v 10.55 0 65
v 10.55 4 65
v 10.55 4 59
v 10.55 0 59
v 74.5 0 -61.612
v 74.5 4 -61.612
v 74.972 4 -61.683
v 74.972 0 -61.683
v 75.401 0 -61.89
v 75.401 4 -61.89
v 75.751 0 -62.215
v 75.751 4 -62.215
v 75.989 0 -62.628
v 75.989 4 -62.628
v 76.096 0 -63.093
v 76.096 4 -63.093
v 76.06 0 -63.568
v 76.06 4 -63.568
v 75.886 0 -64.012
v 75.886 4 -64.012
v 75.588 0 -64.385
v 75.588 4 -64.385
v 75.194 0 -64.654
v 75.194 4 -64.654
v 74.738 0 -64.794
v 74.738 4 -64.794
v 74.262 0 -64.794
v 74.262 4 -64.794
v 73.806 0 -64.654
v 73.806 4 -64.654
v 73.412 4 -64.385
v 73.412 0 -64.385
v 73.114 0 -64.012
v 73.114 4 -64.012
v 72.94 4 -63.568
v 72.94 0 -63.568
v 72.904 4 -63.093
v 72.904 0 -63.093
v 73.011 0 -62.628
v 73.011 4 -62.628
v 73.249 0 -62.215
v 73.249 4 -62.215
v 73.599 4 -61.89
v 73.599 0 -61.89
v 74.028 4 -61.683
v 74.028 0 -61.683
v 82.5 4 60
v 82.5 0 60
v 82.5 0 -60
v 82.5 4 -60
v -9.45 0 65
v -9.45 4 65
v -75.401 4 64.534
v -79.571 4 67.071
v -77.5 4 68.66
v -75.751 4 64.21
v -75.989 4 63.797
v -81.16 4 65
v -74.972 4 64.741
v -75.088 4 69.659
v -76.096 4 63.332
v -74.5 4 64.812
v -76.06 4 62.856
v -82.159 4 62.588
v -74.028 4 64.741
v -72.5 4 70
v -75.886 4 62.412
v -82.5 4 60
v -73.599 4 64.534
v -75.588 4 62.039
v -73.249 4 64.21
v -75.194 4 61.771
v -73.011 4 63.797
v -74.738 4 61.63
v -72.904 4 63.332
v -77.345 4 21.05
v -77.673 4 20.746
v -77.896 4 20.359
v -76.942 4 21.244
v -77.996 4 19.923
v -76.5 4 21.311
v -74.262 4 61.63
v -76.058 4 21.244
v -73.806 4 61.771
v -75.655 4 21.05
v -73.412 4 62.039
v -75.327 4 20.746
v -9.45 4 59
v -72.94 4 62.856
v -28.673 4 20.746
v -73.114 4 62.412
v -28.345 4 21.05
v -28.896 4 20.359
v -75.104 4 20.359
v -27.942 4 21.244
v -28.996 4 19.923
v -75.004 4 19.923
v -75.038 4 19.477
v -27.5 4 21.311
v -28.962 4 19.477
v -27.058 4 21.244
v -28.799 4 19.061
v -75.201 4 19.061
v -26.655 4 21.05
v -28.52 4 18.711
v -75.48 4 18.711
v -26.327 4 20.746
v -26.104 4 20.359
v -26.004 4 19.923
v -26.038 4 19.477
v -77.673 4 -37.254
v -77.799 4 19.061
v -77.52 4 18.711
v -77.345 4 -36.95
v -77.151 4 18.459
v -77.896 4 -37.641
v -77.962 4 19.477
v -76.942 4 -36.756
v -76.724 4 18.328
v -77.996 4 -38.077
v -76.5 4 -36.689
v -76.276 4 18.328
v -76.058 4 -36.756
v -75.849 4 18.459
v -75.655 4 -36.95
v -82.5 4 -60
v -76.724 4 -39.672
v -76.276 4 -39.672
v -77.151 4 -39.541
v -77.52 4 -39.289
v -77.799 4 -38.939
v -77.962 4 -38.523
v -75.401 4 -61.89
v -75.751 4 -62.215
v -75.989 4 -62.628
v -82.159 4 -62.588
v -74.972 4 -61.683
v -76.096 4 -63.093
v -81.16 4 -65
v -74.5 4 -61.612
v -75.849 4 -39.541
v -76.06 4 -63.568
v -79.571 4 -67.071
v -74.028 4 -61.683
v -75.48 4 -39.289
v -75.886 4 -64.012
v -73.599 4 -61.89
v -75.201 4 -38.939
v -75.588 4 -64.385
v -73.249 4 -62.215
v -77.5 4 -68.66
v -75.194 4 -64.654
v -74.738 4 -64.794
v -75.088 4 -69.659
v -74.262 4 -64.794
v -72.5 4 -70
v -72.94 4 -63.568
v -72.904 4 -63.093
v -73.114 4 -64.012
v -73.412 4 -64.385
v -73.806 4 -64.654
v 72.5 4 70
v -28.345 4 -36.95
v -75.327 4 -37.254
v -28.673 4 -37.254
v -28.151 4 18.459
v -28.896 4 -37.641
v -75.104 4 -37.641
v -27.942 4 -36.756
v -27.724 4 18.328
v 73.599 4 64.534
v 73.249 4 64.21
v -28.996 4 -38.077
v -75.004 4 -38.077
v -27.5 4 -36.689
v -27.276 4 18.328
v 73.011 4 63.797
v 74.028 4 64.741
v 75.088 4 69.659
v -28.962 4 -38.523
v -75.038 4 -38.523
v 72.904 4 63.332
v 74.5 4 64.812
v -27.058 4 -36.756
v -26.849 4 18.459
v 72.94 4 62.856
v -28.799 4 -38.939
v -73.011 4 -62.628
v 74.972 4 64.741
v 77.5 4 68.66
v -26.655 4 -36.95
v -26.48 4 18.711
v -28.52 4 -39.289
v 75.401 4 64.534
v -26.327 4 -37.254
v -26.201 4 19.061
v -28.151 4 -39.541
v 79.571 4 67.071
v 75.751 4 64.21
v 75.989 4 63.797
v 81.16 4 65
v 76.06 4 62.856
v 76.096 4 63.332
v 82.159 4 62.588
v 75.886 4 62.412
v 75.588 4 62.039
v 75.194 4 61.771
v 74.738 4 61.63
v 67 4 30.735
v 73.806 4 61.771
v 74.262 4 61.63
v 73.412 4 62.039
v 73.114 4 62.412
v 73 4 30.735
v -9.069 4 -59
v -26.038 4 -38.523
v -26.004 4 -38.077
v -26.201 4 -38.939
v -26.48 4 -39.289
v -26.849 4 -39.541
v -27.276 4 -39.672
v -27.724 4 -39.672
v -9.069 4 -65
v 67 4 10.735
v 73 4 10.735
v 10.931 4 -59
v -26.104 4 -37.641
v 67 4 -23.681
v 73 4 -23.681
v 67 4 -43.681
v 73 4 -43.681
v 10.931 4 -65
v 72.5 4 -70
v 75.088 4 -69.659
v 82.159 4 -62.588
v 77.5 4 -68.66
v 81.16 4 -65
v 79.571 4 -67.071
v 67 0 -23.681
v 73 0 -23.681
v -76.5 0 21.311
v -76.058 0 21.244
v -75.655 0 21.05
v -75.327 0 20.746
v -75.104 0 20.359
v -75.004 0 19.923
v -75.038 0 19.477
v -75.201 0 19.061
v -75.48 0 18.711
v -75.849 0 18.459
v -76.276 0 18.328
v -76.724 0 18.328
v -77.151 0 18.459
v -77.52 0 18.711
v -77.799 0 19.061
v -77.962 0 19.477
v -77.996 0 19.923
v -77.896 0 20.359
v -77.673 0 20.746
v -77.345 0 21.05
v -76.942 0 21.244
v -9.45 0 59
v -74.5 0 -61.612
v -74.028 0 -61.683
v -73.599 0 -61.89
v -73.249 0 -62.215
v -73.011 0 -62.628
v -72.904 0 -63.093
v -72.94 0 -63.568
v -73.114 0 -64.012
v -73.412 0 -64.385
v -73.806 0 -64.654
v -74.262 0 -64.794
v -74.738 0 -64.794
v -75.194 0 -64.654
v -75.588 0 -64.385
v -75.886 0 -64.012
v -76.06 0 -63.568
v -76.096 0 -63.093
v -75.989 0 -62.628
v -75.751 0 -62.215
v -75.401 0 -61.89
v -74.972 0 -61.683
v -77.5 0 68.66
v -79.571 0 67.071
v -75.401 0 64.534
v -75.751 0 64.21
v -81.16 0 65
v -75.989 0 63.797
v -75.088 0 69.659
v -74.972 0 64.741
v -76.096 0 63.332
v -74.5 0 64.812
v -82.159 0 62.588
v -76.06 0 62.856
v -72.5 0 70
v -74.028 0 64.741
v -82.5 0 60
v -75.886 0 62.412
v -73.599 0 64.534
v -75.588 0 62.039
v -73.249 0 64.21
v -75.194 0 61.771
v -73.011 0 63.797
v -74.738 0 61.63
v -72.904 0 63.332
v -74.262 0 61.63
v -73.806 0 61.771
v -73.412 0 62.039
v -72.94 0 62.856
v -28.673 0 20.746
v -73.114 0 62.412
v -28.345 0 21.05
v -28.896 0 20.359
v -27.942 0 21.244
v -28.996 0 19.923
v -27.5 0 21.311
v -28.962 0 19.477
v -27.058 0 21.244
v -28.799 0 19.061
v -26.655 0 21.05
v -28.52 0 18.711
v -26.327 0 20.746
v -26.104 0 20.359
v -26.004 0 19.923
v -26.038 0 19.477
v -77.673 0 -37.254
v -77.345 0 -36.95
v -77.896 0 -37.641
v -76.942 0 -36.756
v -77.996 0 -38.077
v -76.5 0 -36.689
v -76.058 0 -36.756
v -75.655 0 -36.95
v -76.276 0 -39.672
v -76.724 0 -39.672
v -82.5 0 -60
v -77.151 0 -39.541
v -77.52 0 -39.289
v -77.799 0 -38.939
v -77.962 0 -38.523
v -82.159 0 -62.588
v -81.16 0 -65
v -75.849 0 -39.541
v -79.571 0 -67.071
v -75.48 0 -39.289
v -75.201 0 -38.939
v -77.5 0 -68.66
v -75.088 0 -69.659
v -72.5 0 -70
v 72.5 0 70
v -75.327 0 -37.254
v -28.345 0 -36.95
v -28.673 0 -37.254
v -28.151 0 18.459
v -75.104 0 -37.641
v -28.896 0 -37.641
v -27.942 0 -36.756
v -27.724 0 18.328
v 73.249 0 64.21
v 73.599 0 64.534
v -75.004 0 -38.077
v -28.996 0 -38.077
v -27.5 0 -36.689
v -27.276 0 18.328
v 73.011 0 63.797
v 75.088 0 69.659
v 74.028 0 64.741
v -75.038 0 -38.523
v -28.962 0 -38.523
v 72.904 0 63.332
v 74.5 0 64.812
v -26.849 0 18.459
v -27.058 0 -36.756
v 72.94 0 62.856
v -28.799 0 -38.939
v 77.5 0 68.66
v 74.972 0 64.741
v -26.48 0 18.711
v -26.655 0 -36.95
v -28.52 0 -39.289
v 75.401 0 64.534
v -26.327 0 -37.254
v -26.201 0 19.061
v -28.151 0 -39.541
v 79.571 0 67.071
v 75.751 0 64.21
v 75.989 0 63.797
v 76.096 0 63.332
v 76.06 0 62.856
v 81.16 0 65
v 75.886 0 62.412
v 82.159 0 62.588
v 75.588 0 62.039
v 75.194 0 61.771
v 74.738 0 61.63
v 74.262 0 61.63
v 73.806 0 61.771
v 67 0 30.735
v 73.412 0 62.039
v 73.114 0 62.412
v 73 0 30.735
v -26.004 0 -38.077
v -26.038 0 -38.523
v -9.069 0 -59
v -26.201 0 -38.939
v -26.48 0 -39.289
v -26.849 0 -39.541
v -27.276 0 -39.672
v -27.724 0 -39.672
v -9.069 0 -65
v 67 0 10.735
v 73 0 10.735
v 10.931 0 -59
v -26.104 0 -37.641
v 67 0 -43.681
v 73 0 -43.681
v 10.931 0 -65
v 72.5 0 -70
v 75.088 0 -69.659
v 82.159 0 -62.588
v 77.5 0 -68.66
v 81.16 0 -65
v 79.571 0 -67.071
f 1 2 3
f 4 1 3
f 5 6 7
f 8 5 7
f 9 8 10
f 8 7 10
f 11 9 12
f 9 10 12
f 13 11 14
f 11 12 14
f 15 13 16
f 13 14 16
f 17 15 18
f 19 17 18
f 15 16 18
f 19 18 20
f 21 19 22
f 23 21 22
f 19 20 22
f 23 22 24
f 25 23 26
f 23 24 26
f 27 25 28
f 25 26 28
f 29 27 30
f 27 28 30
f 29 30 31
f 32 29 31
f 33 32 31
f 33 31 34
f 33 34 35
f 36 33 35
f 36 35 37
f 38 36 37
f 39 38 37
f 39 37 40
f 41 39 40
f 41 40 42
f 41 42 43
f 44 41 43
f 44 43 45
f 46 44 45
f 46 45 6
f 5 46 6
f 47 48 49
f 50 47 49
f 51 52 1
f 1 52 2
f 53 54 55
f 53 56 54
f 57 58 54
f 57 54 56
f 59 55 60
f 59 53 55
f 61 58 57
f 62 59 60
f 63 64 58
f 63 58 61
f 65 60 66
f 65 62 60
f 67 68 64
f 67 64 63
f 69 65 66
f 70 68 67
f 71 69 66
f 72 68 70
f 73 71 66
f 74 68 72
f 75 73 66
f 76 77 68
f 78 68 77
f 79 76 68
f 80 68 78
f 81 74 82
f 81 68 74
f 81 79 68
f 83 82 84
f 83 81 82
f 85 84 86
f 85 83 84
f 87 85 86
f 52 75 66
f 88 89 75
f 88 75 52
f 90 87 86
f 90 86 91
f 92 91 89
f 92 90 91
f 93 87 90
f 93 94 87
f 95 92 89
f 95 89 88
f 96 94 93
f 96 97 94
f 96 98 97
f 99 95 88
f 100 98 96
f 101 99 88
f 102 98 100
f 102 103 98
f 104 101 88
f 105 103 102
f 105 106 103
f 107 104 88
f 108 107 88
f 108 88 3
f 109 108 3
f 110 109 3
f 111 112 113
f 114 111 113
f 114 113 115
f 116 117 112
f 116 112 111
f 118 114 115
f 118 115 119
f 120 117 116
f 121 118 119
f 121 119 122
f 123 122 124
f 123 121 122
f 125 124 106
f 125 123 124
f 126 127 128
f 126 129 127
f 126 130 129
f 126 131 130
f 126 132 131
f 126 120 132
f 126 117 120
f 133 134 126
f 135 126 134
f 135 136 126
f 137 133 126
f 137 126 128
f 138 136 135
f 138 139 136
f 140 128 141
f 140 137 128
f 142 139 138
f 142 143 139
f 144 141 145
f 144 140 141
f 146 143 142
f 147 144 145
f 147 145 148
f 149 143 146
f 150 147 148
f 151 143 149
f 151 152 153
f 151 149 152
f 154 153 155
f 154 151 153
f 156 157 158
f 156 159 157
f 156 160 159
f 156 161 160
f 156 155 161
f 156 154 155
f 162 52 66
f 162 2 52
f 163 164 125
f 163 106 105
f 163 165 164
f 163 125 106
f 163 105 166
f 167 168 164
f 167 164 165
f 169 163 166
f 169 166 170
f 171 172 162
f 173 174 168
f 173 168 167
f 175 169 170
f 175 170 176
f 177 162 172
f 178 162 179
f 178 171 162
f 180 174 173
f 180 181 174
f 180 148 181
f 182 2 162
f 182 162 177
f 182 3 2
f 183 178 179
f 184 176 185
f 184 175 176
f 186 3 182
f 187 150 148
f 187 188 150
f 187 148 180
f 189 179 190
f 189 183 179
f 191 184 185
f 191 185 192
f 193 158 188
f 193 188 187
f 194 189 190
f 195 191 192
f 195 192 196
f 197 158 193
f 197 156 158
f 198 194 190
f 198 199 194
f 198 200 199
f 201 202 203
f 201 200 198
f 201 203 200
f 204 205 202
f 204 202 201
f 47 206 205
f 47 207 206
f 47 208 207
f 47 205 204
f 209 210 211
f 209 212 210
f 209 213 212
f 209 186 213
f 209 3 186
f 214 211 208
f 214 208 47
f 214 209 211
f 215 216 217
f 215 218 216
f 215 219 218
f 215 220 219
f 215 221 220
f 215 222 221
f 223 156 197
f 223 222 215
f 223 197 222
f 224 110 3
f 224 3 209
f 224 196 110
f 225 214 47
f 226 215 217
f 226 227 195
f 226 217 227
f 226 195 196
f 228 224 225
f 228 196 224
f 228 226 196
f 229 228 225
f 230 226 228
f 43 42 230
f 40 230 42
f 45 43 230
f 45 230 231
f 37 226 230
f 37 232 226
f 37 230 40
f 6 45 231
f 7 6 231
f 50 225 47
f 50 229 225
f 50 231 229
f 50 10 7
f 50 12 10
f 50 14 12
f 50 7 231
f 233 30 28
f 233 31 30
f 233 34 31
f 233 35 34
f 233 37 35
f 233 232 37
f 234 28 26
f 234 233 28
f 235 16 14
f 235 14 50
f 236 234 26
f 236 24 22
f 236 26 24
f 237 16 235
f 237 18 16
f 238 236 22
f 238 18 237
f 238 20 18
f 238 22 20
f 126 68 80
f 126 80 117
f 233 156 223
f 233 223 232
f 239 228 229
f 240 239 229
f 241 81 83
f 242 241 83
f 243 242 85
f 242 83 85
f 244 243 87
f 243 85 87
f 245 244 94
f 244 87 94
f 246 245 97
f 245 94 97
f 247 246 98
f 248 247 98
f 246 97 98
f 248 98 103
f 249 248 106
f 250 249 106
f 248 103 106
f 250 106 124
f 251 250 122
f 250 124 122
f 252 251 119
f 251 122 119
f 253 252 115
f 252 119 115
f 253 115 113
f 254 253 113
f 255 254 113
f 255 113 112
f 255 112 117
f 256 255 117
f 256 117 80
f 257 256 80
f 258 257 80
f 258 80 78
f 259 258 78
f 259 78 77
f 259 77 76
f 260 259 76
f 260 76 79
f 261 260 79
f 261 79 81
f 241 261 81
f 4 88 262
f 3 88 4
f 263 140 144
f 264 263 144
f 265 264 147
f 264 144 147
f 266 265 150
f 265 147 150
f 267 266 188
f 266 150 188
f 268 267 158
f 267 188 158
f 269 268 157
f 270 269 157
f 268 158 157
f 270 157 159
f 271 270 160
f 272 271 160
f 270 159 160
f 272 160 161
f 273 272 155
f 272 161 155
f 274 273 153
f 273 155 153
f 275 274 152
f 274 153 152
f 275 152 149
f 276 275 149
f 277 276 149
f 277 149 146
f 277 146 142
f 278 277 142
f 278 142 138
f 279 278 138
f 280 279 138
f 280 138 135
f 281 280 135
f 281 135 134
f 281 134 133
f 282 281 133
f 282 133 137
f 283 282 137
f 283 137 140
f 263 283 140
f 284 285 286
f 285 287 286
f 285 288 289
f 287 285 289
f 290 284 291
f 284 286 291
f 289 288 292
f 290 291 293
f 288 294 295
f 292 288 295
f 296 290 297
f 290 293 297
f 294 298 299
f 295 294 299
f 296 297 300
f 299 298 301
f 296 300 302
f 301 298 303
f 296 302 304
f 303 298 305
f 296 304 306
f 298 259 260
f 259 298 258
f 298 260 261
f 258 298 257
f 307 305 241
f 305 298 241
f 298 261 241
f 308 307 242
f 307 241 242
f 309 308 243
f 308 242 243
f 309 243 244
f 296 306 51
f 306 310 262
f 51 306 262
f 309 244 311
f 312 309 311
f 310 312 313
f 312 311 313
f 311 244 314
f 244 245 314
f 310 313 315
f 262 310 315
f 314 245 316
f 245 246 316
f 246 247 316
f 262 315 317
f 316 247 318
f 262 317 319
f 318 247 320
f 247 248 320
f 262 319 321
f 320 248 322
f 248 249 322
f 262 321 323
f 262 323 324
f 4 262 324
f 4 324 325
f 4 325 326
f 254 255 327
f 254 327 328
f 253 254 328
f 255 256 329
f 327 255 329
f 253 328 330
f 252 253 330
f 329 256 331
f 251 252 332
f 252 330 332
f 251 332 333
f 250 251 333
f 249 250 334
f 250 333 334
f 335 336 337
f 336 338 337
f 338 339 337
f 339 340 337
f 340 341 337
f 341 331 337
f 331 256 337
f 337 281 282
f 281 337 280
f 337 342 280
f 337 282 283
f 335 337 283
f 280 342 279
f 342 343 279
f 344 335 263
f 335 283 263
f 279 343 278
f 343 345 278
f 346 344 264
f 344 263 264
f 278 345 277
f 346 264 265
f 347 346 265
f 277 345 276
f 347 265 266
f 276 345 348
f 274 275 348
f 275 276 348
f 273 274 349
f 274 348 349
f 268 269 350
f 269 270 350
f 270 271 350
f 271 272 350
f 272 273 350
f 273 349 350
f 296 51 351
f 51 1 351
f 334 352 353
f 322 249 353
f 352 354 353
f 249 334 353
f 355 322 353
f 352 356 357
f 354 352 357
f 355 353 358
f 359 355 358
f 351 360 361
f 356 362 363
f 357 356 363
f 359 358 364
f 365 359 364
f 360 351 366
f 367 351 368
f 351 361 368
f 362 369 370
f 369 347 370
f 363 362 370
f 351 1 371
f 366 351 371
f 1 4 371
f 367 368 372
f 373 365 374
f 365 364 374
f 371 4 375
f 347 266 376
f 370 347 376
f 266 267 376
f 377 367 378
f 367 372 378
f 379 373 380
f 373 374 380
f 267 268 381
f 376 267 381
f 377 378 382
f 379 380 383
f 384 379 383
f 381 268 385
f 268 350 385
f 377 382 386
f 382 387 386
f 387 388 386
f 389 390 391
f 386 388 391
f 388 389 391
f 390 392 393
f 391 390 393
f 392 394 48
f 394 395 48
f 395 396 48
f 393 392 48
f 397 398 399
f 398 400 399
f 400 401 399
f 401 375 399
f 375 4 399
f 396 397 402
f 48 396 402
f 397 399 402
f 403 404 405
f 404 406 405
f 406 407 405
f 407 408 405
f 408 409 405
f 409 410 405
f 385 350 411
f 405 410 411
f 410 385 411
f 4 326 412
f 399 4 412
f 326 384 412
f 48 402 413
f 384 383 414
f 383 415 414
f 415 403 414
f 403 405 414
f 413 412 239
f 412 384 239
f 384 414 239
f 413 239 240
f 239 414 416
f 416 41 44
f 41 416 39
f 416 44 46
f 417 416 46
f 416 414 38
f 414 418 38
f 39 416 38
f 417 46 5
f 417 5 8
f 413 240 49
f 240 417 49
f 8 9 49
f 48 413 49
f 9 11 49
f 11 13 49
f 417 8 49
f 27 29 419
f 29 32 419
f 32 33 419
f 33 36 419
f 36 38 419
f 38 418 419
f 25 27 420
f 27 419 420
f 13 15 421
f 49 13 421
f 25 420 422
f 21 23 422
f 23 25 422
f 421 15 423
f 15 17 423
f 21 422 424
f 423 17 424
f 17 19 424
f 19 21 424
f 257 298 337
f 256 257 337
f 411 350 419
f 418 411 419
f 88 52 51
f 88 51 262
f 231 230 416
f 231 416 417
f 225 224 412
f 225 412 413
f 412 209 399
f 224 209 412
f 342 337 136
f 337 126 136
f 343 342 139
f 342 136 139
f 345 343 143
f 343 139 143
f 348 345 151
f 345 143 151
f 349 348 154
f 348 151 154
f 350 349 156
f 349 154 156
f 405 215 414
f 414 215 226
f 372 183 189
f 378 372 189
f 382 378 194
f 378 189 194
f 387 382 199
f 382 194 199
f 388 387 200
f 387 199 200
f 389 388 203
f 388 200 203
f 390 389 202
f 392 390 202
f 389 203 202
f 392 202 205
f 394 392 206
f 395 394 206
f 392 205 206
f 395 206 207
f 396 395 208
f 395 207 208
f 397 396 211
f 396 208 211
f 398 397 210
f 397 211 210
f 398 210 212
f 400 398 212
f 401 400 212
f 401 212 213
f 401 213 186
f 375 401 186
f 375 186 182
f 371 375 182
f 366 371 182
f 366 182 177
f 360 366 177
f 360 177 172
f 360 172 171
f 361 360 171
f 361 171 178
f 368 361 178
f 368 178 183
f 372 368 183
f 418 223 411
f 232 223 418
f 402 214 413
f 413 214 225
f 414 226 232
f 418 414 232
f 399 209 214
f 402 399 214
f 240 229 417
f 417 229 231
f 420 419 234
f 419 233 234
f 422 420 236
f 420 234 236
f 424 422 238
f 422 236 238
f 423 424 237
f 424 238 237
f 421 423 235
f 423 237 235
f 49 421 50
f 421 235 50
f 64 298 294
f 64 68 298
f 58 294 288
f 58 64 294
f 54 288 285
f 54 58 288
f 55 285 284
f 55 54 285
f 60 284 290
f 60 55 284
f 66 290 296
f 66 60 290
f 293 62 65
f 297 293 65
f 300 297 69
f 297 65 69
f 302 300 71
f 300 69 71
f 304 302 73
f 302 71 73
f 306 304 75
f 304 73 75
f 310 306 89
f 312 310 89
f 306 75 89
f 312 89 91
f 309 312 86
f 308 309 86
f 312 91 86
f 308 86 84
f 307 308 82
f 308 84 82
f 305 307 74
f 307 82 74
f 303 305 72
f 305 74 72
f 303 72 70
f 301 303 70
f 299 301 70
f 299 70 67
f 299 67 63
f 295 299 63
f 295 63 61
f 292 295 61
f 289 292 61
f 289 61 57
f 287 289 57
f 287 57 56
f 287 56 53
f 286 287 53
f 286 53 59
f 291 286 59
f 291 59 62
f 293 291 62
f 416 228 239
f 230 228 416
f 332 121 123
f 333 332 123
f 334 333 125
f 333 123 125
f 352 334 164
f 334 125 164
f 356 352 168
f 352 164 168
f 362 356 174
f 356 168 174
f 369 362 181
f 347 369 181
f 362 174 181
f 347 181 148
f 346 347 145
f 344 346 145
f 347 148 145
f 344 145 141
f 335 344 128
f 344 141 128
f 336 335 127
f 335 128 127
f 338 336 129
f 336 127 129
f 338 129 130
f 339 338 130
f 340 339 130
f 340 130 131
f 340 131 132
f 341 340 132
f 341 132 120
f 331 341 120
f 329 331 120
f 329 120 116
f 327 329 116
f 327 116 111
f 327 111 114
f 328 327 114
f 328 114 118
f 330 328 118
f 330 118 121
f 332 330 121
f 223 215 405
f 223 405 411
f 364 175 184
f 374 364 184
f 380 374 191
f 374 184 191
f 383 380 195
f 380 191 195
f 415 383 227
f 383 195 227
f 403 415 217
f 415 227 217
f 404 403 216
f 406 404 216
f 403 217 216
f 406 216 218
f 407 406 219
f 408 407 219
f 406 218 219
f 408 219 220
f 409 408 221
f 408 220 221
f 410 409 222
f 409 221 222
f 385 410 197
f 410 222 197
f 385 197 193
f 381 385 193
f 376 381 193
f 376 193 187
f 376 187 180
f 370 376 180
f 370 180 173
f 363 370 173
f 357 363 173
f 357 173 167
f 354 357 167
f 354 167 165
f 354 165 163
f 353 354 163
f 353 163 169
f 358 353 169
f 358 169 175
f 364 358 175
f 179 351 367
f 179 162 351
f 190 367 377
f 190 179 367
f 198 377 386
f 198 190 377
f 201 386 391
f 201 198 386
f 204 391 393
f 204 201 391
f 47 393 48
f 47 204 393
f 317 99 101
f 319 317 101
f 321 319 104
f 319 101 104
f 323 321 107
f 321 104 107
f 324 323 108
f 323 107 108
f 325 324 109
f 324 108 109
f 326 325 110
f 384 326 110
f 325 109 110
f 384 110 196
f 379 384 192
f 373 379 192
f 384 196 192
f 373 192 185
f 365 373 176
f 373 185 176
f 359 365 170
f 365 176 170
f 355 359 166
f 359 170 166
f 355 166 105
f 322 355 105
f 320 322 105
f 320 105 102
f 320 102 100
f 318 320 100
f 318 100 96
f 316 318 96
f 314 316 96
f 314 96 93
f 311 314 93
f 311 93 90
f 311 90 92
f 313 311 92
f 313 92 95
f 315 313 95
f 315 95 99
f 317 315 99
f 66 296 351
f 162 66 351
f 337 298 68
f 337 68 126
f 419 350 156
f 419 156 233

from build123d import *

# Parameters (mm, degrees)
SKETCH1_W           = 165
SKETCH1_H           = 140
BOSS_EXTRUDE1_DEPTH = 4
SKETCH2_R           = 1.6
CUT_EXTRUDE1_DEPTH  = 10
FILLET1_R           = 10
SKETCH3_R           = 1.5
CUT_EXTRUDE2_DEPTH  = 10
SKETCH4_W           = 6
SKETCH4_H           = 20
SKETCH4_W_2         = 20
SKETCH4_H_2         = 6
CUT_EXTRUDE3_DEPTH  = 10


with BuildPart() as part:
    # Sketch1 → Boss-Extrude1 (new body)
    with BuildSketch(Plane(origin=(0, 0, 0), x_dir=(1, 0, 0), z_dir=(0, 1, 0))):
        Rectangle(SKETCH1_W, SKETCH1_H)
    extrude(amount=BOSS_EXTRUDE1_DEPTH)

    # Sketch2 → Cut-Extrude1 (cut)
    with BuildSketch(Plane(origin=(0, 4, 0), x_dir=(1, 0, 0), z_dir=(0, 1, 0))):
        with Locations(Location((-74.5, 63.212121212, 0), (0, 0, 270))):
            Circle(SKETCH2_R)
        with Locations(Location((-74.5, -63.212121212, 0), (0, 0, 270))):
            Circle(SKETCH2_R)
        with Locations(Location((74.5, -63.212121212, 0), (0, 0, 270))):
            Circle(SKETCH2_R)
        with Locations(Location((74.5, 63.212121212, 0), (0, 0, 270))):
            Circle(SKETCH2_R)
    extrude(amount=-CUT_EXTRUDE1_DEPTH, mode=Mode.SUBTRACT)

    # Fillet1
    fillet1_edges = [part.edges().sort_by_distance(p)[0] for p in [
        (82.5, 2, 70),
        (-82.5, 2, 70),
        (-82.5, 2, -70),
        (82.5, 2, -70),
    ]]
    fillet(fillet1_edges, radius=FILLET1_R)

    # Sketch3 → Cut-Extrude2 (cut)
    with BuildSketch(Plane(origin=(0, 4, 0), x_dir=(1, 0, 0), z_dir=(0, 1, 0))):
        with Locations(Location((-76.5, 38.189224362, 0), (0, 0, 270))):
            Circle(SKETCH3_R)
        with Locations(Location((-27.5, 38.189224362, 0), (0, 0, 270))):
            Circle(SKETCH3_R)
        with Locations(Location((-76.5, -19.810775638, 0), (0, 0, 270))):
            Circle(SKETCH3_R)
        with Locations(Location((-27.5, -19.810775638, 0), (0, 0, 270))):
            Circle(SKETCH3_R)
    extrude(amount=-CUT_EXTRUDE2_DEPTH, mode=Mode.SUBTRACT)

    # Sketch4 → Cut-Extrude3 (cut)
    with BuildSketch(Plane(origin=(0, 4, 0), x_dir=(1, 0, 0), z_dir=(0, 1, 0))):
        with Locations((70, 33.680953207)):
            Rectangle(SKETCH4_W, SKETCH4_H)
        with Locations((70, -20.735149517)):
            Rectangle(SKETCH4_W, SKETCH4_H)
        with Locations((0.550060732, -62)):
            Rectangle(SKETCH4_W_2, SKETCH4_H_2)
        with Locations((0.930649546, 62)):
            Rectangle(SKETCH4_W_2, SKETCH4_H_2)
    extrude(amount=-CUT_EXTRUDE3_DEPTH, mode=Mode.SUBTRACT)


solid = part.part
